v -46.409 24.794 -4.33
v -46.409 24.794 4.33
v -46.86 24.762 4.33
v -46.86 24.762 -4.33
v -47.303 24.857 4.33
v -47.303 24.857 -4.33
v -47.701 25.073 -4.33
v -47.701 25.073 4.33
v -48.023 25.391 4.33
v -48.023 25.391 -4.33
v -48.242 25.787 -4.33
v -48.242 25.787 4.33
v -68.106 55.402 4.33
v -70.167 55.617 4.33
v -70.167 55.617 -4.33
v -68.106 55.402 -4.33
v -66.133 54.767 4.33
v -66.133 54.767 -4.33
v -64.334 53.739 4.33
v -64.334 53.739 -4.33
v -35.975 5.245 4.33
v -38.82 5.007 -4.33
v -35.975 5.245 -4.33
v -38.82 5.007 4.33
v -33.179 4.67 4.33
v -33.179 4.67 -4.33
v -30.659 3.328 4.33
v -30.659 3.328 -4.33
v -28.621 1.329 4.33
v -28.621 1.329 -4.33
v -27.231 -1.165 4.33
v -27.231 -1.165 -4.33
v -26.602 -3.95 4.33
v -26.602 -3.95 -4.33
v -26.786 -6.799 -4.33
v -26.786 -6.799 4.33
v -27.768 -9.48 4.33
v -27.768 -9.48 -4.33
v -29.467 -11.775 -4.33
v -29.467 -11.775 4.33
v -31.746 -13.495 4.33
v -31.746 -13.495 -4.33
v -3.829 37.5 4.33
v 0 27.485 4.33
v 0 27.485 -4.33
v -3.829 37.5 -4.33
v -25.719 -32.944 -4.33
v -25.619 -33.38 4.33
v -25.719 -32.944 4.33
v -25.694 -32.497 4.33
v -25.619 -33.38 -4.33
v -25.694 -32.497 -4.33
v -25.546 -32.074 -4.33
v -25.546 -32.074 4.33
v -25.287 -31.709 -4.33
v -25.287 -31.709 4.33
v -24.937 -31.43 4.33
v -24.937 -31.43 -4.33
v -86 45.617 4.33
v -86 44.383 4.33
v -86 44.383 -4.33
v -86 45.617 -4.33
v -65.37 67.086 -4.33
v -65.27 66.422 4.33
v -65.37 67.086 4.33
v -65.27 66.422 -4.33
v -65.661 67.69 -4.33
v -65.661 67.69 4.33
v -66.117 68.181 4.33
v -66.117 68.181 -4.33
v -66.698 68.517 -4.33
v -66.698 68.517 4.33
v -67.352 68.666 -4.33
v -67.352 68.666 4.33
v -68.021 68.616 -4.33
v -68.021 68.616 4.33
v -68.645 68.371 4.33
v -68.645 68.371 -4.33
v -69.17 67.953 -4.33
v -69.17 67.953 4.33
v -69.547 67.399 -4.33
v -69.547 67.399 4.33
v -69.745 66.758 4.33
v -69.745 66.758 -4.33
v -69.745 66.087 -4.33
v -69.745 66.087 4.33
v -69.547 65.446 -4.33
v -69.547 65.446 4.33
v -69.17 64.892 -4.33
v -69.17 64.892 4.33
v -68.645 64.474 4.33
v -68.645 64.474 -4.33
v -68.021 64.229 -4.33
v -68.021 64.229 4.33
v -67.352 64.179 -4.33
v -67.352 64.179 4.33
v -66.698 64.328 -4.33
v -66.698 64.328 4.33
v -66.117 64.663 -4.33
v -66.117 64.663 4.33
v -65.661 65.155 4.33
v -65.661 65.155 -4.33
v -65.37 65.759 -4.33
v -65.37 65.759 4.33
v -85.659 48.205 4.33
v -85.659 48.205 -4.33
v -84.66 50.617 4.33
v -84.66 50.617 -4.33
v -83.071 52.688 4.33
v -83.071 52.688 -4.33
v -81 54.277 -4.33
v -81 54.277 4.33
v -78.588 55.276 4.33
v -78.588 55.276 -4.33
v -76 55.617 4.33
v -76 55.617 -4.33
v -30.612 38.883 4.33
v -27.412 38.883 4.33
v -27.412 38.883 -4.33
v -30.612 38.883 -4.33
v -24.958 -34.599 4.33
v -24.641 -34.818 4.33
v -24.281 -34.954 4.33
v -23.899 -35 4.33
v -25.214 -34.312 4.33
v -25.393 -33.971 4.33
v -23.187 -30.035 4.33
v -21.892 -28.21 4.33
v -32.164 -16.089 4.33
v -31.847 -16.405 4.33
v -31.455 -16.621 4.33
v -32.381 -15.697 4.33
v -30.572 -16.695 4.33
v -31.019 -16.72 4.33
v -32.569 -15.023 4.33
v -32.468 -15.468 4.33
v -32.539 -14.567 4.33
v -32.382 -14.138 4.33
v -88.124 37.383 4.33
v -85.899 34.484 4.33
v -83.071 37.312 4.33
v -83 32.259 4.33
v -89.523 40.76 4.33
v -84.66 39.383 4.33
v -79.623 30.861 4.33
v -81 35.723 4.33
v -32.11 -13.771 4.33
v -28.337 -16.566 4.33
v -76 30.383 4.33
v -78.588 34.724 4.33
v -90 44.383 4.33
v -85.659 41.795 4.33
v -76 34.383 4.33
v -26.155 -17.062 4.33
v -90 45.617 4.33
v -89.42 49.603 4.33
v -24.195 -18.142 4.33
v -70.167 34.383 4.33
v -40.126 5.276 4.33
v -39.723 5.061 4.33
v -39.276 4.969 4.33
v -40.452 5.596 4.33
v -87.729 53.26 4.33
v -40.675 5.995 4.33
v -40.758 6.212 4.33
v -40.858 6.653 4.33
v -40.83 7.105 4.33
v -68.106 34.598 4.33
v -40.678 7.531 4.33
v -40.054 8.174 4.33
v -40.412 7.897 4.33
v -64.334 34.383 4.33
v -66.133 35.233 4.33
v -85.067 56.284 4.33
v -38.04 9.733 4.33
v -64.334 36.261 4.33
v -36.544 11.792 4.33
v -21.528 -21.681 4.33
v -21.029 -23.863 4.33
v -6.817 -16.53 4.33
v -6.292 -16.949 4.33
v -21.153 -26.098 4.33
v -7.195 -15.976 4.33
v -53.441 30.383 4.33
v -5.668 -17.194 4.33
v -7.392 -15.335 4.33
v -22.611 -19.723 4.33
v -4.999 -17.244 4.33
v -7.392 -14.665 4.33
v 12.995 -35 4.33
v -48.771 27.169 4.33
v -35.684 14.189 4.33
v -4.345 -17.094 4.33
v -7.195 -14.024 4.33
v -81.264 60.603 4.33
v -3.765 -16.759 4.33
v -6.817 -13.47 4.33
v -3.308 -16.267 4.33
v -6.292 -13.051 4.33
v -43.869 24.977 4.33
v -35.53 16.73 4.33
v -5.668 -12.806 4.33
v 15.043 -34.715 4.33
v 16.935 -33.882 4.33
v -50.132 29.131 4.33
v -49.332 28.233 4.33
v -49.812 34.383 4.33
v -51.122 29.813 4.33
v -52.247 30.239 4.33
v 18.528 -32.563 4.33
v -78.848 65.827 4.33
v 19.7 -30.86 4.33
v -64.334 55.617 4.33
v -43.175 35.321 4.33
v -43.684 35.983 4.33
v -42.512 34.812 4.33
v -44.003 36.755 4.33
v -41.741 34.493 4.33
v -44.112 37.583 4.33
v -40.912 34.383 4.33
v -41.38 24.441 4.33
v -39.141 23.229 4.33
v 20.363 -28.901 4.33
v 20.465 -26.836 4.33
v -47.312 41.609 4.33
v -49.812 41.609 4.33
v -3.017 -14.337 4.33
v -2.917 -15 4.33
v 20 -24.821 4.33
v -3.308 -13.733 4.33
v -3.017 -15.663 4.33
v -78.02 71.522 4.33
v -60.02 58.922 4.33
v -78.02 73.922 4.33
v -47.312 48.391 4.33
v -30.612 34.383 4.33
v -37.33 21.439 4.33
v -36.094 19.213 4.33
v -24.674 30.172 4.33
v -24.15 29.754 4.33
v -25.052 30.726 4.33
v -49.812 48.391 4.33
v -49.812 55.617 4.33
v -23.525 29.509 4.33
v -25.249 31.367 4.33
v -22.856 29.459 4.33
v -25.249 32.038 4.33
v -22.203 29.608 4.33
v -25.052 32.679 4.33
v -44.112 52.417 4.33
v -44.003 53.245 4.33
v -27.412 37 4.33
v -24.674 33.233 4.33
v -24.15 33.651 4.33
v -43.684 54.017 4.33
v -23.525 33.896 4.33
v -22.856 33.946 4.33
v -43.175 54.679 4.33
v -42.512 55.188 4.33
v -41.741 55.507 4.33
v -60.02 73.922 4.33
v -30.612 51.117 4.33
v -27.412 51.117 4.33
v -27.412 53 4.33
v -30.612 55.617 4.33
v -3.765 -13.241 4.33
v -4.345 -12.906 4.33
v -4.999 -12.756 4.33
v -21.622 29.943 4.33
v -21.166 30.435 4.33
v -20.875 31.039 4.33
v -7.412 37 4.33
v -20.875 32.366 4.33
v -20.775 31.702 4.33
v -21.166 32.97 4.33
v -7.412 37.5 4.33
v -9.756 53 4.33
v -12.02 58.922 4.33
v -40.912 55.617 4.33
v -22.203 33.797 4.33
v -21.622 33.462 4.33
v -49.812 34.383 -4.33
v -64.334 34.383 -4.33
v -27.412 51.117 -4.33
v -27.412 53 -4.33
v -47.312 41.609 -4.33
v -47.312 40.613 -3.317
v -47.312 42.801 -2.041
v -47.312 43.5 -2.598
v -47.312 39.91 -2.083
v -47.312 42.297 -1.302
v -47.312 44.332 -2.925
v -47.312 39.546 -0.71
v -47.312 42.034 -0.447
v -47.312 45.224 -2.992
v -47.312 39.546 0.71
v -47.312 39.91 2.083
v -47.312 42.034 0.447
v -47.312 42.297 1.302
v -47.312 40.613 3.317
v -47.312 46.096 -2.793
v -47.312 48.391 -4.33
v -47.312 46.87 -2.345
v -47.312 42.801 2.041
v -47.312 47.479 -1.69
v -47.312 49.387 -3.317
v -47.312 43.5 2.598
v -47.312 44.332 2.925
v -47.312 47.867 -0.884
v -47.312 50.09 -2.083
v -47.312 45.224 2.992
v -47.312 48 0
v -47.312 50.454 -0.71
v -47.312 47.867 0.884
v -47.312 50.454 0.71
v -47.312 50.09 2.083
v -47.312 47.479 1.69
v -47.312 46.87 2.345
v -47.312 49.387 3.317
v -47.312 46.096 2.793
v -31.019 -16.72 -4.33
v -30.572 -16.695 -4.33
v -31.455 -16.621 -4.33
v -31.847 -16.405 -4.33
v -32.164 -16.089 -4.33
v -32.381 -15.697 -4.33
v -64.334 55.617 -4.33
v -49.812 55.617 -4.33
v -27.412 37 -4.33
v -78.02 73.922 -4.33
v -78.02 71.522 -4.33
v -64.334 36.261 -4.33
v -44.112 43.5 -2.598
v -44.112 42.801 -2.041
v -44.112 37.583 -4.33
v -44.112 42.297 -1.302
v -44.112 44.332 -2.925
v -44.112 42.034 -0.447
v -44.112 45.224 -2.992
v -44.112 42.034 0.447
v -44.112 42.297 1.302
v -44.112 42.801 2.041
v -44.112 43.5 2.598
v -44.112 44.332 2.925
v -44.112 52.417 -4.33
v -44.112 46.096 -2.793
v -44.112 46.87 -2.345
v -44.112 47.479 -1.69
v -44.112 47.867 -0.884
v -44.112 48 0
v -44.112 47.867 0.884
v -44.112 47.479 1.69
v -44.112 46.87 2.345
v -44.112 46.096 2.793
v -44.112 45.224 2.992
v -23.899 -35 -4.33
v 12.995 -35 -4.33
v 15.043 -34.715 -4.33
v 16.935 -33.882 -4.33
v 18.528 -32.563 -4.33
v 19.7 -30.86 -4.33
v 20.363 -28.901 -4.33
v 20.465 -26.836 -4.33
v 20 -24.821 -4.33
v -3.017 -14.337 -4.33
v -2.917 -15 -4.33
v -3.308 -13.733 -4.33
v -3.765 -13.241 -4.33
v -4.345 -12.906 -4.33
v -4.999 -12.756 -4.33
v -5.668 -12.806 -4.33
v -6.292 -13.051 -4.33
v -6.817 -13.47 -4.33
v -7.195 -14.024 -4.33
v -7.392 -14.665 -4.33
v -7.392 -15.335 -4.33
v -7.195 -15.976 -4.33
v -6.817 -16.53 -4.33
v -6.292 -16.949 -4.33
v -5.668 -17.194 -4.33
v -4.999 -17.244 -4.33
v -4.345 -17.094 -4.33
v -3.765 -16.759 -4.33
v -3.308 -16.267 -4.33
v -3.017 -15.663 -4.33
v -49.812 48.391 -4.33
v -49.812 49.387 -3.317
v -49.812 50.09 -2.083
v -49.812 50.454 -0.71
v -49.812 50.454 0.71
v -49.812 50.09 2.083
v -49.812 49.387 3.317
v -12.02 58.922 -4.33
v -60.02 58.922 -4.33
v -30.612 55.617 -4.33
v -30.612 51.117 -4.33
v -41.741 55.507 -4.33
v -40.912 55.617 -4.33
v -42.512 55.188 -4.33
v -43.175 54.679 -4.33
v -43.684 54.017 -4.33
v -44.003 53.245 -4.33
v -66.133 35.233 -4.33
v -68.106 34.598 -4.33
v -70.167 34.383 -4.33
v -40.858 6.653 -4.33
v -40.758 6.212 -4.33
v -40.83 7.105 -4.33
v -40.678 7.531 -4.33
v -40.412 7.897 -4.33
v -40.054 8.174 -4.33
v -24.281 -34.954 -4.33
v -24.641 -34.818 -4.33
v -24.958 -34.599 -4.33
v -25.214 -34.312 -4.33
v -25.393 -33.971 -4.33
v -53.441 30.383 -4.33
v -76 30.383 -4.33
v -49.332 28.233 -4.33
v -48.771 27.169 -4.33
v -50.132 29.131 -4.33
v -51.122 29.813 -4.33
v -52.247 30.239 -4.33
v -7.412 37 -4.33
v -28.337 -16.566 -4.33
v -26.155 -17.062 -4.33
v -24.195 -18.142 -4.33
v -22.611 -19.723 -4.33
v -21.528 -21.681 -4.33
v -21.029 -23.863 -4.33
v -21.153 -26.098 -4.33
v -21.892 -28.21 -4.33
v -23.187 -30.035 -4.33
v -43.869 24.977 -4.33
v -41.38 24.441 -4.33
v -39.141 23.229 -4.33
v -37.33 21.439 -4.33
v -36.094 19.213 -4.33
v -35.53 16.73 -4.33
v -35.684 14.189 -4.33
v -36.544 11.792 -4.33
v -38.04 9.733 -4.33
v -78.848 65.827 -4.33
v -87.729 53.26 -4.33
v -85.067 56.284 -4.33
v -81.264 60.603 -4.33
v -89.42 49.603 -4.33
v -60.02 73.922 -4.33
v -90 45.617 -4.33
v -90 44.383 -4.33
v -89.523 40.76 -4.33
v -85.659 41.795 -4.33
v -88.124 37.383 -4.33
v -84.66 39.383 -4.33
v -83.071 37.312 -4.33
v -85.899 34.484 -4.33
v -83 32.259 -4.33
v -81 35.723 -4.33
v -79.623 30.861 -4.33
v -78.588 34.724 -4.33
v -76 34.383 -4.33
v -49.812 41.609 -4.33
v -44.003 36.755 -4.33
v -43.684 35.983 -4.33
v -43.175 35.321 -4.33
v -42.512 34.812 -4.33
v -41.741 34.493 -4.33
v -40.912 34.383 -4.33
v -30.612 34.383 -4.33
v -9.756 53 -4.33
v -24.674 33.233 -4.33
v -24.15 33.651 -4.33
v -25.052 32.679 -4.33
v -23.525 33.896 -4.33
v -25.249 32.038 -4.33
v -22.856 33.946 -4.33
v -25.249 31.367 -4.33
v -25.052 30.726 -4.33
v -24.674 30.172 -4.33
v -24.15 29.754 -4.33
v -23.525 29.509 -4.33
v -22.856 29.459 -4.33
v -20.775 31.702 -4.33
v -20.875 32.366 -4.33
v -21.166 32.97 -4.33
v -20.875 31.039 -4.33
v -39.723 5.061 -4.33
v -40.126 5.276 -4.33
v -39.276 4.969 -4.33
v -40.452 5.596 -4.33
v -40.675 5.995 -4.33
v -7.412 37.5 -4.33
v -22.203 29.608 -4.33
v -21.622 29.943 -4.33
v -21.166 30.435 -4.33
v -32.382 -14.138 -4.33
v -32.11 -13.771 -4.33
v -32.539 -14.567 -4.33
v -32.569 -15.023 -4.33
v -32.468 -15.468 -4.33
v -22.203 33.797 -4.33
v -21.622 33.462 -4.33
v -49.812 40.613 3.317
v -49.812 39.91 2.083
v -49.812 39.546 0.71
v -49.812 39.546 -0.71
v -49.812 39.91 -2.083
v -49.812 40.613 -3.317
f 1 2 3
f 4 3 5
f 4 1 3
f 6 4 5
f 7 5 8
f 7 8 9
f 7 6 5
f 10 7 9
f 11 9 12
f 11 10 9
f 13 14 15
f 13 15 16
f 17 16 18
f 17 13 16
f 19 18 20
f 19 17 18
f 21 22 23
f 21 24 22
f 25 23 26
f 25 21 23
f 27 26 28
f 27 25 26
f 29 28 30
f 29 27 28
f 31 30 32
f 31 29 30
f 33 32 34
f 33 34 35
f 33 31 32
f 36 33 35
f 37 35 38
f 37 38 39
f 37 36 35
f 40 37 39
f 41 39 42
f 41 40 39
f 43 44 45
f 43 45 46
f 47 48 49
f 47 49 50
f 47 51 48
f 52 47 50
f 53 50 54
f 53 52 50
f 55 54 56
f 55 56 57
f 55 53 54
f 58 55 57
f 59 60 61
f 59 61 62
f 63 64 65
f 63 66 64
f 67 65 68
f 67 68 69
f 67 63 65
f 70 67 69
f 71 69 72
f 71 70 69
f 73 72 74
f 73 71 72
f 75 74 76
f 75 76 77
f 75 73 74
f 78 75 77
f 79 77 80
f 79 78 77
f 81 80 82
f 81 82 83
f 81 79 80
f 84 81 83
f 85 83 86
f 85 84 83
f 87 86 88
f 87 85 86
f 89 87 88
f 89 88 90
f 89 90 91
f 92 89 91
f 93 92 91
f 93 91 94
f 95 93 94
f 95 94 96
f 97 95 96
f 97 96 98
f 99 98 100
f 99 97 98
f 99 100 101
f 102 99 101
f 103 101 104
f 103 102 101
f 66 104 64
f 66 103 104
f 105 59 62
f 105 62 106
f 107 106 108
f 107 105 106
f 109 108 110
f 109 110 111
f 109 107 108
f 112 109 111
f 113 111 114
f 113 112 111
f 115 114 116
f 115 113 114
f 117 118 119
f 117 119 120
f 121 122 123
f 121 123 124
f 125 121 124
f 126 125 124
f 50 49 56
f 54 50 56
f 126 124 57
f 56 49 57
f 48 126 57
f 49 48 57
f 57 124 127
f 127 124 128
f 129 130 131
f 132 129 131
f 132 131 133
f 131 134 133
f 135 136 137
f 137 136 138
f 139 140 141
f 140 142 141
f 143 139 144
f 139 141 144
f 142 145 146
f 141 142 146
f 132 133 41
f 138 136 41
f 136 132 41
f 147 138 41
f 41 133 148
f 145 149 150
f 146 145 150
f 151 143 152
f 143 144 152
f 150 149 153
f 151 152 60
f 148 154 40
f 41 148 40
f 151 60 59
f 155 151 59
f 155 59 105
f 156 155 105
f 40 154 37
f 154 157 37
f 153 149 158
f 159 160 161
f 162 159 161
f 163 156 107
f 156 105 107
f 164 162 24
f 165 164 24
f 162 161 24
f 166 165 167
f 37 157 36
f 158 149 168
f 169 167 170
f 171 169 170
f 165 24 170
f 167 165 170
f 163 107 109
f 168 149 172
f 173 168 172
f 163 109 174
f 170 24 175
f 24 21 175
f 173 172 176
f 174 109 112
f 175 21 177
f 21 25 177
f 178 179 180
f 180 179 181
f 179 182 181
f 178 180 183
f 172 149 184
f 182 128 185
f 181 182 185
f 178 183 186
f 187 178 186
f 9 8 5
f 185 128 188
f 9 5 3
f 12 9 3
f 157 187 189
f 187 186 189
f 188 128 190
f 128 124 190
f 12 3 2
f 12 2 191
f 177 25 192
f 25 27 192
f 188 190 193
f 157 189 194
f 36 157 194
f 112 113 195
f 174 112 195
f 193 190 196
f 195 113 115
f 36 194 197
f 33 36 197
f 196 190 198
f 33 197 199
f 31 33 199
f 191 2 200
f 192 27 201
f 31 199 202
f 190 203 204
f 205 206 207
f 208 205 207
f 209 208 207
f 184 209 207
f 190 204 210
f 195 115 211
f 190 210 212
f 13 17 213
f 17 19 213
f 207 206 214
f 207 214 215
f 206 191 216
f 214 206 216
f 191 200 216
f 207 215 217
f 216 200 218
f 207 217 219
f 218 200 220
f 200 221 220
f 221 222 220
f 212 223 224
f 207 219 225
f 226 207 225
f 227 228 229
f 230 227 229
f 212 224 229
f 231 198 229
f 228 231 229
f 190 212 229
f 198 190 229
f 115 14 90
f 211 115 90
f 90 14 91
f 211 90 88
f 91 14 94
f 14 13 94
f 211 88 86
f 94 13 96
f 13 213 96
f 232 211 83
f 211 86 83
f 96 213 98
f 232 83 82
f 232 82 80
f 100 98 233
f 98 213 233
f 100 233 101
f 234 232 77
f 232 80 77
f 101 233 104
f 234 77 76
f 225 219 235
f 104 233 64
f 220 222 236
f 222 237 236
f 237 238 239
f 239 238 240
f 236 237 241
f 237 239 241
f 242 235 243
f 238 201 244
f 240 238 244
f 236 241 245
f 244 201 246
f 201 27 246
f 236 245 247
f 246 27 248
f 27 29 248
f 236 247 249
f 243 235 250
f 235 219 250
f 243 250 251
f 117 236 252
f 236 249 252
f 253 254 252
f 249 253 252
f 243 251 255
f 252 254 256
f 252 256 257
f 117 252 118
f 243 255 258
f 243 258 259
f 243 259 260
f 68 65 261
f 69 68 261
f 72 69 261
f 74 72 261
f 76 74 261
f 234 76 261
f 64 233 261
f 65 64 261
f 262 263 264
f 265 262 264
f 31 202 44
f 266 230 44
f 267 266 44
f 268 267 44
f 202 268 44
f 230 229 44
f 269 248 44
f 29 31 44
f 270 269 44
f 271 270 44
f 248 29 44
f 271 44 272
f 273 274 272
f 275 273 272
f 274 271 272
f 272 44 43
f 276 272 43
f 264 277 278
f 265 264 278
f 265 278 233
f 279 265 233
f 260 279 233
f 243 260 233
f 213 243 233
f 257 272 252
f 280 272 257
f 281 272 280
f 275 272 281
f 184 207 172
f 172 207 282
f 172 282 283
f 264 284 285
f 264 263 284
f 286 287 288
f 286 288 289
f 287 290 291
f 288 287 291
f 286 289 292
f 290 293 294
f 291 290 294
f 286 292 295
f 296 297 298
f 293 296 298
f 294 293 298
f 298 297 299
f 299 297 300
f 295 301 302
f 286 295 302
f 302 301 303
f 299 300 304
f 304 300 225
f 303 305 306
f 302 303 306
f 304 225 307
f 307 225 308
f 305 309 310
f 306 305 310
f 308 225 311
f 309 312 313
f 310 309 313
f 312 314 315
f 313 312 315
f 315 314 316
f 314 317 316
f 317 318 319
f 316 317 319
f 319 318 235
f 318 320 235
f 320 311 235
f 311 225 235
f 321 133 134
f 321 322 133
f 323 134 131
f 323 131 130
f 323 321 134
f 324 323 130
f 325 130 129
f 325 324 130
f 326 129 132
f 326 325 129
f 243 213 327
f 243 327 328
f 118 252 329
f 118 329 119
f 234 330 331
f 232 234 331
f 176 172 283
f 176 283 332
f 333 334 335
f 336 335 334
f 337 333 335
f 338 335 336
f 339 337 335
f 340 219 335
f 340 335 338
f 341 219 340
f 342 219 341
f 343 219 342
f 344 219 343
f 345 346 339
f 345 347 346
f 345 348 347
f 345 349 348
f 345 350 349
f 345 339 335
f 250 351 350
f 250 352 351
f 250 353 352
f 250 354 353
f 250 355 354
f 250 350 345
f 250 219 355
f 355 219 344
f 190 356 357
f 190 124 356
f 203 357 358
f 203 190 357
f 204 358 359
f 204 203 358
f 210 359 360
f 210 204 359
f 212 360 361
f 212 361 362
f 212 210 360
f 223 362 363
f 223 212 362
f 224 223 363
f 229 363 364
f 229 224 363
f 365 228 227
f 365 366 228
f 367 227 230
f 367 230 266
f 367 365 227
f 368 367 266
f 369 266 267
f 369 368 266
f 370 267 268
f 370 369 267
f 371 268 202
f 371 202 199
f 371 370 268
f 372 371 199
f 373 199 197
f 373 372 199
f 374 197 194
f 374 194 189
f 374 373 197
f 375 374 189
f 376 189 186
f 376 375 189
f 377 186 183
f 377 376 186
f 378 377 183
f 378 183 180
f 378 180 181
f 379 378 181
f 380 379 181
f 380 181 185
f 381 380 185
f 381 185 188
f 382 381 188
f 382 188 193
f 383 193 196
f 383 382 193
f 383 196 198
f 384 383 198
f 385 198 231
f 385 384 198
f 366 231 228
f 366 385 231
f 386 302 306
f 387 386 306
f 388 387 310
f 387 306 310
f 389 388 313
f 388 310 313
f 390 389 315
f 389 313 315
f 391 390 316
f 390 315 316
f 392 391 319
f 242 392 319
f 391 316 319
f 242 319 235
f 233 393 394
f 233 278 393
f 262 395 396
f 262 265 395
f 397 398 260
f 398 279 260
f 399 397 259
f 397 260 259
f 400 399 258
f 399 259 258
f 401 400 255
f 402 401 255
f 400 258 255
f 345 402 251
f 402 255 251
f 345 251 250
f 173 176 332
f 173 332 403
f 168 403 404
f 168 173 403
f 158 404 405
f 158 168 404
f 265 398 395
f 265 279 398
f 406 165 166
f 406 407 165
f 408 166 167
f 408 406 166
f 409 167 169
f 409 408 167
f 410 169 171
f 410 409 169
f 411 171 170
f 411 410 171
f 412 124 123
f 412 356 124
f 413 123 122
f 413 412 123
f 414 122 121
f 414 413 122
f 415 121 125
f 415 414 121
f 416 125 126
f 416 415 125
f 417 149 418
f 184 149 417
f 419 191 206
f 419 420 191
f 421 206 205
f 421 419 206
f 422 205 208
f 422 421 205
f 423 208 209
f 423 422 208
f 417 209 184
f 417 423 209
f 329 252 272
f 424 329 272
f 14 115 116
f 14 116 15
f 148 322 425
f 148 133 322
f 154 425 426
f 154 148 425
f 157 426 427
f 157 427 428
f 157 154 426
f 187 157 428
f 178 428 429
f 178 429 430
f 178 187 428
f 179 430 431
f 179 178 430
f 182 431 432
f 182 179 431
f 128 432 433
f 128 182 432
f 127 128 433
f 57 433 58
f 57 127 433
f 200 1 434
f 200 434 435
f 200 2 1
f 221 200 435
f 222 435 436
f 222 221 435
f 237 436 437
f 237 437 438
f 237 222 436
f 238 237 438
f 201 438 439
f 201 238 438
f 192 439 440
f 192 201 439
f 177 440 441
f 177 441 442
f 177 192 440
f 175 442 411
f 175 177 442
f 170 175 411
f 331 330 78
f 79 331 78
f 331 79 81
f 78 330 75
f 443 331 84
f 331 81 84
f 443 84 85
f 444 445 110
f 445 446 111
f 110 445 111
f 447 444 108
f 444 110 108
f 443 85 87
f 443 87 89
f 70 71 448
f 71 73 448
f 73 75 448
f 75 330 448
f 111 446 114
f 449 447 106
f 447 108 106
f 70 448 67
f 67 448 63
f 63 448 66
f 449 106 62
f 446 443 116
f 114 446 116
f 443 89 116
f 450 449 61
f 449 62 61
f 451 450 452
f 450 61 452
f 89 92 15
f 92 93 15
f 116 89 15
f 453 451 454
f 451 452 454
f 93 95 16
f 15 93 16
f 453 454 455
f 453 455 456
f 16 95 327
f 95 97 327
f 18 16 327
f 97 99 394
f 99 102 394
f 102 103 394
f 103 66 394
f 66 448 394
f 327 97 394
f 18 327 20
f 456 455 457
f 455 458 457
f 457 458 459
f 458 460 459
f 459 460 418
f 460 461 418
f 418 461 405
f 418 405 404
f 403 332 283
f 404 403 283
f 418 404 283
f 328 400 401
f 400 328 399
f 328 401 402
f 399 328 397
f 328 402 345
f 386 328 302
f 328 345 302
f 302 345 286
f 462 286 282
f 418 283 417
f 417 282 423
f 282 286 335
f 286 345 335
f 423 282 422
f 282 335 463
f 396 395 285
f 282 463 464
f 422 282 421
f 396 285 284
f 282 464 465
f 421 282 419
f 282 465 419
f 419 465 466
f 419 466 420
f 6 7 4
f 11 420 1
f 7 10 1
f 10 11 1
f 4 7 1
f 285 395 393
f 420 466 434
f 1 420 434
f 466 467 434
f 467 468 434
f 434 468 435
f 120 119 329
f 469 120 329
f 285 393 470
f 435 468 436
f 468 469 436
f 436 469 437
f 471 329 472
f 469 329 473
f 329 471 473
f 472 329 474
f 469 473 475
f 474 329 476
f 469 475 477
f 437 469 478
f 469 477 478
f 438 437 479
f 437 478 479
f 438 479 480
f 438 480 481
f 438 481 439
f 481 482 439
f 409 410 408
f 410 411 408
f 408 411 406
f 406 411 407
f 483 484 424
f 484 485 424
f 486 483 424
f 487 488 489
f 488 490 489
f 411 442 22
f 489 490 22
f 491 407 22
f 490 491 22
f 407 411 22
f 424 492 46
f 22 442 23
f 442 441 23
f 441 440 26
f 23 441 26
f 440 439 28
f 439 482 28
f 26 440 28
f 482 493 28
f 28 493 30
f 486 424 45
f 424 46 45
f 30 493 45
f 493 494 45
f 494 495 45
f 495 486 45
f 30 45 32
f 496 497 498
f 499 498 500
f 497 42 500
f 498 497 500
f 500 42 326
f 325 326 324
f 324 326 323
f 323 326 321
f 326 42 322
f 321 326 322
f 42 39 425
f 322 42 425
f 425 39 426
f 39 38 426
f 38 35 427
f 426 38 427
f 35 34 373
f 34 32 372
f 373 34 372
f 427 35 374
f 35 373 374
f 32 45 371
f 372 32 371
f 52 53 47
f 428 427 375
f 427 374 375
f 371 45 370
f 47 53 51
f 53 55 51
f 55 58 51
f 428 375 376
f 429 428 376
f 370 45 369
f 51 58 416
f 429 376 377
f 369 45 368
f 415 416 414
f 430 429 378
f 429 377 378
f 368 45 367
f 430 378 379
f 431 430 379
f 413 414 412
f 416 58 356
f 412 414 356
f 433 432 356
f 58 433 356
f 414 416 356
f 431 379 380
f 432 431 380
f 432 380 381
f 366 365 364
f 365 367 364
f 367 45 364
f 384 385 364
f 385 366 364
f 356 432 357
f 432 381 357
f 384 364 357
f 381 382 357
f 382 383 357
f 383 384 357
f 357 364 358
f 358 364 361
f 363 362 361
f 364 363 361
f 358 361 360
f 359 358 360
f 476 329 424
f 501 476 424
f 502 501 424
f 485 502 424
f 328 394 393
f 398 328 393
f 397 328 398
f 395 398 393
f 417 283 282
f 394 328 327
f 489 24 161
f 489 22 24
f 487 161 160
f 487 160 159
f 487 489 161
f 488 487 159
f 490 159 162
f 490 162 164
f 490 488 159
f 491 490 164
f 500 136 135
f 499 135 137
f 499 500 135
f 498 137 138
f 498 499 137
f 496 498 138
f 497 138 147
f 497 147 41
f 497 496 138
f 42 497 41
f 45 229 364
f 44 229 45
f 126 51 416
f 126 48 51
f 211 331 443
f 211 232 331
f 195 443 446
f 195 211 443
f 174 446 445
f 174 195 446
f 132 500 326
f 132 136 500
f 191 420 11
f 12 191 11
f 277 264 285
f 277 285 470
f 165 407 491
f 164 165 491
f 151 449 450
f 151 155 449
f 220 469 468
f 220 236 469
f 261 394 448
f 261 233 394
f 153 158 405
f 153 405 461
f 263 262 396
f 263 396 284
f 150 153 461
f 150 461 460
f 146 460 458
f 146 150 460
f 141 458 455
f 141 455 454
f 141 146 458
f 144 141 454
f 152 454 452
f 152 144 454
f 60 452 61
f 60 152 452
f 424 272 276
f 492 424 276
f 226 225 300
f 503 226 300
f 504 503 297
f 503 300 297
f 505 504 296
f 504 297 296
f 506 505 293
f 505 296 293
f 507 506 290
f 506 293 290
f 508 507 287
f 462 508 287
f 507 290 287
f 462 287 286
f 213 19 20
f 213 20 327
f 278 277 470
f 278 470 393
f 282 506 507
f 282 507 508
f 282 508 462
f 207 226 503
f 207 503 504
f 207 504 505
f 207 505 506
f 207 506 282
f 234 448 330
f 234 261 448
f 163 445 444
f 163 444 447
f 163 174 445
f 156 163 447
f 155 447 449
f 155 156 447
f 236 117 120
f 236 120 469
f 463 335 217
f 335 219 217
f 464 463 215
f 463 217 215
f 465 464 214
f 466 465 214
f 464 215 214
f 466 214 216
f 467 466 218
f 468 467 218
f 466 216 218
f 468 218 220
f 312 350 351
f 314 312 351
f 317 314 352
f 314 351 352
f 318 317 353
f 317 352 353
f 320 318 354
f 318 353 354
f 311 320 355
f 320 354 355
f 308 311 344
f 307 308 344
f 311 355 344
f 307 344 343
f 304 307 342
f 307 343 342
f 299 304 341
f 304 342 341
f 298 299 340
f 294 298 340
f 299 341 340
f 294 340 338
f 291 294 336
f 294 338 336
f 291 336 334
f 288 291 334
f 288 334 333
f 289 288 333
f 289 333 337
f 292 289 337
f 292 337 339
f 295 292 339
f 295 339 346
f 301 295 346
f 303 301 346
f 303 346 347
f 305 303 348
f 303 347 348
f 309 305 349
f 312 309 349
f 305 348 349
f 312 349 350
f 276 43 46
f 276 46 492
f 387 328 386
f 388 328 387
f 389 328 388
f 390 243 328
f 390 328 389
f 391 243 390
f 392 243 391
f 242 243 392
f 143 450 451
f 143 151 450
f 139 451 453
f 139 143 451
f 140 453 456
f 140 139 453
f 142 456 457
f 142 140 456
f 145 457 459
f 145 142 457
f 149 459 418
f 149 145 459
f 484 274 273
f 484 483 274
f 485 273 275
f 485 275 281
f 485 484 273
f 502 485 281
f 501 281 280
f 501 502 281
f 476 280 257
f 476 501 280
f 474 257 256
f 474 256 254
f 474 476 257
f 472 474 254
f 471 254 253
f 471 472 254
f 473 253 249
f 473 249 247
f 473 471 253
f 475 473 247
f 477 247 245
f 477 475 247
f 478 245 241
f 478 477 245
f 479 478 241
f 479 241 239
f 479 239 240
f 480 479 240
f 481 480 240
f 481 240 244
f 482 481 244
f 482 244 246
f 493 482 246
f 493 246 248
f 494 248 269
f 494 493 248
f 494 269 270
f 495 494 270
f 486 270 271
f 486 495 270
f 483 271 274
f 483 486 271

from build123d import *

# Parameters (mm, degrees)
F0_R     = 2.25
F1_DEPTH = 4.330125
F2_W     = 20
F2_H     = 16
F3_DEPTH = 12.5
F4_R     = 3.2
F5_W     = 6.4
F5_H     = 8.66025
F5_R     = 3
F6_DEPTH = 3.2
F8_DEPTH = 2.5
F9_R     = 1.6
F10_R    = 5


# Not quite as in the source:
# - ends of sketch curves that miss each other by under 0.0002 mm in the source are joined


with BuildPart() as f1:
    # F0 (on Top) → F1 (new body, symmetric)
    with BuildSketch(Plane.XY):
        with BuildLine():
            Line((20, -24.8214285714), (0, 27.4853587511))
            Line((0, 27.4853587511), (-3.829193786, 37.5))
            Line((-3.829193786, 37.5), (-12.6123318144, 37.5))
            Line((-12.6123318144, 37.5), (-25.6123318144, 37.5))
            Line((-25.6123318144, 37.5), (-25.6123318144, 38.8834841531))
            Line((-25.6123318144, 38.8834841531), (-30.6123318144, 38.8834841531))
            Line((-30.6123318144, 38.8834841531), (-30.6123318144, 34.3834841531))
            Line((-30.6123318144, 34.3834841531), (-44.1123318144, 34.3834841531))
            Line((-44.1123318144, 34.3834841531), (-44.1123318144, 41.8))
            Line((-44.1123318144, 41.8), (-47.3123318144, 41.8))
            Line((-47.3123318144, 41.8), (-47.3123318144, 34.3834841531))
            Line((-47.3123318144, 34.3834841531), (-64.3336698413, 34.3834841531))
            Line((-64.3336698413, 34.3834841531), (-64.3336698413, 36.2610286334))
            ThreePointArc((-64.3336698413, 36.2610286334), (-67.1028911134, 34.8644323695), (-70.1668349206, 34.3834792274))
            Line((-70.1668349206, 34.3834792274), (-76, 34.3834841531))
            ThreePointArc((-76, 34.3834841531), (-83.0710678119, 37.3124163412), (-86, 44.3834841531))
            Line((-86, 44.3834841531), (-86, 45.6165158469))
            ThreePointArc((-86, 45.6165158469), (-83.0710678119, 52.6875836588), (-76, 55.6165158469))
            Line((-76, 55.6165158469), (-70.1668349206, 55.6165158469))
            ThreePointArc((-70.1668349206, 55.6165158469), (-67.1028911134, 55.1355676305), (-64.3336698413, 53.7389713666))
            Line((-64.3336698413, 53.7389713666), (-64.3336698413, 55.6165158469))
            Line((-64.3336698413, 55.6165158469), (-47.3123318144, 55.6165158469))
            Line((-47.3123318144, 55.6165158469), (-47.3123318144, 48.2))
            Line((-47.3123318144, 48.2), (-44.1123318144, 48.2))
            Line((-44.1123318144, 48.2), (-44.1123318144, 55.6165158469))
            Line((-44.1123318144, 55.6165158469), (-30.6123318144, 55.6165158469))
            Line((-30.6123318144, 55.6165158469), (-30.6123318144, 51.1165158469))
            Line((-30.6123318144, 51.1165158469), (-25.6123318144, 51.1165158469))
            Line((-25.6123318144, 51.1165158469), (-25.6123318144, 52.5))
            Line((-25.6123318144, 52.5), (-12.6123318144, 52.5))
            Line((-12.6123318144, 52.5), (-9.5645871327, 52.5))
            Line((-9.5645871327, 52.5), (-12.0202176002, 58.9223070303))
            Line((-12.0202176002, 58.9223070303), (-60.0202176002, 58.9223070303))
            Line((-60.0202176002, 58.9223070303), (-60.0202176002, 73.9223070303))
            Line((-60.0202176002, 73.9223070303), (-78.0202176002, 73.9223070303))
            Line((-78.0202176002, 73.9223070303), (-78.0202176002, 71.5223070303))
            ThreePointArc((-78.0202176002, 71.5223070303), (-79.8672373555, 63.1277070855), (-85.0671484236, 56.2836063342))
            ThreePointArc((-85.0671484236, 56.2836063342), (-88.7070861713, 51.4927358083), (-90, 45.6165158469))
            Line((-90, 45.6165158469), (-90, 44.3834841531))
            ThreePointArc((-90, 44.3834841531), (-85.8994949366, 34.4839892165), (-76, 30.3834841531))
            Line((-76, 30.3834841531), (-50, 30.3834841531))
            Line((-50, 30.3834841531), (-47.7142857143, 24.405565602))
            ThreePointArc((-47.7142857143, 24.405565602), (-36.0935520375, 19.2134033537), (-41.2857142857, 7.5926696769))
            Line((-41.2857142857, 7.5926696769), (-40.1428571429, 4.6037104013))
            ThreePointArc((-40.1428571429, 4.6037104013), (-27.2309308353, -1.1653587634), (-33, -14.077285071))
            Line((-33, -14.077285071), (-31.8571428571, -17.0662443466))
            ThreePointArc((-31.8571428571, -17.0662443466), (-21.5276018111, -21.6814996784), (-26.1428571429, -32.0110407244))
            Line((-26.1428571429, -32.0110407244), (-25, -35))
            Line((-25, -35), (12.9946266979, -35))
            ThreePointArc((12.9946266979, -35), (19.1727852307, -31.7521003214), (20, -24.8214285714))
        make_face()
        with Locations((-5.1674522335, -15)):
            Circle(F0_R, mode=Mode.SUBTRACT)
        with Locations((-67.5202176002, 66.4223070303)):
            Circle(F0_R, mode=Mode.SUBTRACT)
        with Locations((-23.0245950907, 31.7024886808)):
            Circle(F0_R, mode=Mode.SUBTRACT)
    extrude(amount=F1_DEPTH, both=True)

    # F2 (on Top) → F3 (cut, symmetric)
    with BuildSketch(Plane.XY):
        with Locations((-17.4123318144, 45)):
            Rectangle(F2_W, F2_H)
    extrude(amount=F3_DEPTH, both=True, mode=Mode.SUBTRACT)

    # F4
    f4_edges = [f1.edges().sort_by_distance(p)[0] for p in [
        (-44.112332, 55.616516, 0),
        (-44.112332, 34.383484, 0),
    ]]
    fillet(f4_edges, radius=F4_R)

    # F5 (on face) → F6 (join)
    with BuildSketch(Plane.YZ.offset(-44.1123318144)):
        with Locations((45, 0)):
            Rectangle(F5_W, F5_H)
        with Locations((45, 0)):
            Circle(F5_R, mode=Mode.SUBTRACT)
    extrude(amount=-F6_DEPTH)

    # F7 (on face) → F8 (join)
    with BuildSketch(Plane(origin=(-47.3123318144, 0, 0), x_dir=(0, -1, 0), z_dir=(-1, 0, 0))):
        with BuildLine():
            Line((-48.3911675695, 4.330125), (-55.6165158469, 4.330125))
            Line((-55.6165158469, 4.330125), (-55.6165158469, -4.330125))
            Line((-55.6165158469, -4.330125), (-48.3911675695, -4.330125))
            ThreePointArc((-48.3911675695, -4.330125), (-50.5, 0), (-48.3911675695, 4.330125))
        make_face()
        with BuildLine():
            Line((-34.3834841531, -4.330125), (-34.3834841531, 4.330125))
            Line((-34.3834841531, 4.330125), (-41.6088324305, 4.330125))
            ThreePointArc((-41.6088324305, 4.330125), (-39.5, 0), (-41.6088324305, -4.330125))
            Line((-41.6088324305, -4.330125), (-34.3834841531, -4.330125))
        make_face()
    extrude(amount=F8_DEPTH)

    # F9
    f9_edges = [f1.edges().sort_by_distance(p)[0] for p in [
        (-25, -35, 0),
        (-26.142857, -32.011041, 0),
        (-31.857143, -17.066244, 0),
        (-33, -14.077285, 0),
        (-40.142857, 4.60371, 0),
        (-41.285714, 7.59267, 0),
        (-47.714286, 24.405566, 0),
    ]]
    fillet(f9_edges, radius=F9_R)

    # F10
    f10_edges = [f1.edges().sort_by_distance(p)[0] for p in [
        (-50, 30.383484, 0),
    ]]
    fillet(f10_edges, radius=F10_R)


solid = f1.part
